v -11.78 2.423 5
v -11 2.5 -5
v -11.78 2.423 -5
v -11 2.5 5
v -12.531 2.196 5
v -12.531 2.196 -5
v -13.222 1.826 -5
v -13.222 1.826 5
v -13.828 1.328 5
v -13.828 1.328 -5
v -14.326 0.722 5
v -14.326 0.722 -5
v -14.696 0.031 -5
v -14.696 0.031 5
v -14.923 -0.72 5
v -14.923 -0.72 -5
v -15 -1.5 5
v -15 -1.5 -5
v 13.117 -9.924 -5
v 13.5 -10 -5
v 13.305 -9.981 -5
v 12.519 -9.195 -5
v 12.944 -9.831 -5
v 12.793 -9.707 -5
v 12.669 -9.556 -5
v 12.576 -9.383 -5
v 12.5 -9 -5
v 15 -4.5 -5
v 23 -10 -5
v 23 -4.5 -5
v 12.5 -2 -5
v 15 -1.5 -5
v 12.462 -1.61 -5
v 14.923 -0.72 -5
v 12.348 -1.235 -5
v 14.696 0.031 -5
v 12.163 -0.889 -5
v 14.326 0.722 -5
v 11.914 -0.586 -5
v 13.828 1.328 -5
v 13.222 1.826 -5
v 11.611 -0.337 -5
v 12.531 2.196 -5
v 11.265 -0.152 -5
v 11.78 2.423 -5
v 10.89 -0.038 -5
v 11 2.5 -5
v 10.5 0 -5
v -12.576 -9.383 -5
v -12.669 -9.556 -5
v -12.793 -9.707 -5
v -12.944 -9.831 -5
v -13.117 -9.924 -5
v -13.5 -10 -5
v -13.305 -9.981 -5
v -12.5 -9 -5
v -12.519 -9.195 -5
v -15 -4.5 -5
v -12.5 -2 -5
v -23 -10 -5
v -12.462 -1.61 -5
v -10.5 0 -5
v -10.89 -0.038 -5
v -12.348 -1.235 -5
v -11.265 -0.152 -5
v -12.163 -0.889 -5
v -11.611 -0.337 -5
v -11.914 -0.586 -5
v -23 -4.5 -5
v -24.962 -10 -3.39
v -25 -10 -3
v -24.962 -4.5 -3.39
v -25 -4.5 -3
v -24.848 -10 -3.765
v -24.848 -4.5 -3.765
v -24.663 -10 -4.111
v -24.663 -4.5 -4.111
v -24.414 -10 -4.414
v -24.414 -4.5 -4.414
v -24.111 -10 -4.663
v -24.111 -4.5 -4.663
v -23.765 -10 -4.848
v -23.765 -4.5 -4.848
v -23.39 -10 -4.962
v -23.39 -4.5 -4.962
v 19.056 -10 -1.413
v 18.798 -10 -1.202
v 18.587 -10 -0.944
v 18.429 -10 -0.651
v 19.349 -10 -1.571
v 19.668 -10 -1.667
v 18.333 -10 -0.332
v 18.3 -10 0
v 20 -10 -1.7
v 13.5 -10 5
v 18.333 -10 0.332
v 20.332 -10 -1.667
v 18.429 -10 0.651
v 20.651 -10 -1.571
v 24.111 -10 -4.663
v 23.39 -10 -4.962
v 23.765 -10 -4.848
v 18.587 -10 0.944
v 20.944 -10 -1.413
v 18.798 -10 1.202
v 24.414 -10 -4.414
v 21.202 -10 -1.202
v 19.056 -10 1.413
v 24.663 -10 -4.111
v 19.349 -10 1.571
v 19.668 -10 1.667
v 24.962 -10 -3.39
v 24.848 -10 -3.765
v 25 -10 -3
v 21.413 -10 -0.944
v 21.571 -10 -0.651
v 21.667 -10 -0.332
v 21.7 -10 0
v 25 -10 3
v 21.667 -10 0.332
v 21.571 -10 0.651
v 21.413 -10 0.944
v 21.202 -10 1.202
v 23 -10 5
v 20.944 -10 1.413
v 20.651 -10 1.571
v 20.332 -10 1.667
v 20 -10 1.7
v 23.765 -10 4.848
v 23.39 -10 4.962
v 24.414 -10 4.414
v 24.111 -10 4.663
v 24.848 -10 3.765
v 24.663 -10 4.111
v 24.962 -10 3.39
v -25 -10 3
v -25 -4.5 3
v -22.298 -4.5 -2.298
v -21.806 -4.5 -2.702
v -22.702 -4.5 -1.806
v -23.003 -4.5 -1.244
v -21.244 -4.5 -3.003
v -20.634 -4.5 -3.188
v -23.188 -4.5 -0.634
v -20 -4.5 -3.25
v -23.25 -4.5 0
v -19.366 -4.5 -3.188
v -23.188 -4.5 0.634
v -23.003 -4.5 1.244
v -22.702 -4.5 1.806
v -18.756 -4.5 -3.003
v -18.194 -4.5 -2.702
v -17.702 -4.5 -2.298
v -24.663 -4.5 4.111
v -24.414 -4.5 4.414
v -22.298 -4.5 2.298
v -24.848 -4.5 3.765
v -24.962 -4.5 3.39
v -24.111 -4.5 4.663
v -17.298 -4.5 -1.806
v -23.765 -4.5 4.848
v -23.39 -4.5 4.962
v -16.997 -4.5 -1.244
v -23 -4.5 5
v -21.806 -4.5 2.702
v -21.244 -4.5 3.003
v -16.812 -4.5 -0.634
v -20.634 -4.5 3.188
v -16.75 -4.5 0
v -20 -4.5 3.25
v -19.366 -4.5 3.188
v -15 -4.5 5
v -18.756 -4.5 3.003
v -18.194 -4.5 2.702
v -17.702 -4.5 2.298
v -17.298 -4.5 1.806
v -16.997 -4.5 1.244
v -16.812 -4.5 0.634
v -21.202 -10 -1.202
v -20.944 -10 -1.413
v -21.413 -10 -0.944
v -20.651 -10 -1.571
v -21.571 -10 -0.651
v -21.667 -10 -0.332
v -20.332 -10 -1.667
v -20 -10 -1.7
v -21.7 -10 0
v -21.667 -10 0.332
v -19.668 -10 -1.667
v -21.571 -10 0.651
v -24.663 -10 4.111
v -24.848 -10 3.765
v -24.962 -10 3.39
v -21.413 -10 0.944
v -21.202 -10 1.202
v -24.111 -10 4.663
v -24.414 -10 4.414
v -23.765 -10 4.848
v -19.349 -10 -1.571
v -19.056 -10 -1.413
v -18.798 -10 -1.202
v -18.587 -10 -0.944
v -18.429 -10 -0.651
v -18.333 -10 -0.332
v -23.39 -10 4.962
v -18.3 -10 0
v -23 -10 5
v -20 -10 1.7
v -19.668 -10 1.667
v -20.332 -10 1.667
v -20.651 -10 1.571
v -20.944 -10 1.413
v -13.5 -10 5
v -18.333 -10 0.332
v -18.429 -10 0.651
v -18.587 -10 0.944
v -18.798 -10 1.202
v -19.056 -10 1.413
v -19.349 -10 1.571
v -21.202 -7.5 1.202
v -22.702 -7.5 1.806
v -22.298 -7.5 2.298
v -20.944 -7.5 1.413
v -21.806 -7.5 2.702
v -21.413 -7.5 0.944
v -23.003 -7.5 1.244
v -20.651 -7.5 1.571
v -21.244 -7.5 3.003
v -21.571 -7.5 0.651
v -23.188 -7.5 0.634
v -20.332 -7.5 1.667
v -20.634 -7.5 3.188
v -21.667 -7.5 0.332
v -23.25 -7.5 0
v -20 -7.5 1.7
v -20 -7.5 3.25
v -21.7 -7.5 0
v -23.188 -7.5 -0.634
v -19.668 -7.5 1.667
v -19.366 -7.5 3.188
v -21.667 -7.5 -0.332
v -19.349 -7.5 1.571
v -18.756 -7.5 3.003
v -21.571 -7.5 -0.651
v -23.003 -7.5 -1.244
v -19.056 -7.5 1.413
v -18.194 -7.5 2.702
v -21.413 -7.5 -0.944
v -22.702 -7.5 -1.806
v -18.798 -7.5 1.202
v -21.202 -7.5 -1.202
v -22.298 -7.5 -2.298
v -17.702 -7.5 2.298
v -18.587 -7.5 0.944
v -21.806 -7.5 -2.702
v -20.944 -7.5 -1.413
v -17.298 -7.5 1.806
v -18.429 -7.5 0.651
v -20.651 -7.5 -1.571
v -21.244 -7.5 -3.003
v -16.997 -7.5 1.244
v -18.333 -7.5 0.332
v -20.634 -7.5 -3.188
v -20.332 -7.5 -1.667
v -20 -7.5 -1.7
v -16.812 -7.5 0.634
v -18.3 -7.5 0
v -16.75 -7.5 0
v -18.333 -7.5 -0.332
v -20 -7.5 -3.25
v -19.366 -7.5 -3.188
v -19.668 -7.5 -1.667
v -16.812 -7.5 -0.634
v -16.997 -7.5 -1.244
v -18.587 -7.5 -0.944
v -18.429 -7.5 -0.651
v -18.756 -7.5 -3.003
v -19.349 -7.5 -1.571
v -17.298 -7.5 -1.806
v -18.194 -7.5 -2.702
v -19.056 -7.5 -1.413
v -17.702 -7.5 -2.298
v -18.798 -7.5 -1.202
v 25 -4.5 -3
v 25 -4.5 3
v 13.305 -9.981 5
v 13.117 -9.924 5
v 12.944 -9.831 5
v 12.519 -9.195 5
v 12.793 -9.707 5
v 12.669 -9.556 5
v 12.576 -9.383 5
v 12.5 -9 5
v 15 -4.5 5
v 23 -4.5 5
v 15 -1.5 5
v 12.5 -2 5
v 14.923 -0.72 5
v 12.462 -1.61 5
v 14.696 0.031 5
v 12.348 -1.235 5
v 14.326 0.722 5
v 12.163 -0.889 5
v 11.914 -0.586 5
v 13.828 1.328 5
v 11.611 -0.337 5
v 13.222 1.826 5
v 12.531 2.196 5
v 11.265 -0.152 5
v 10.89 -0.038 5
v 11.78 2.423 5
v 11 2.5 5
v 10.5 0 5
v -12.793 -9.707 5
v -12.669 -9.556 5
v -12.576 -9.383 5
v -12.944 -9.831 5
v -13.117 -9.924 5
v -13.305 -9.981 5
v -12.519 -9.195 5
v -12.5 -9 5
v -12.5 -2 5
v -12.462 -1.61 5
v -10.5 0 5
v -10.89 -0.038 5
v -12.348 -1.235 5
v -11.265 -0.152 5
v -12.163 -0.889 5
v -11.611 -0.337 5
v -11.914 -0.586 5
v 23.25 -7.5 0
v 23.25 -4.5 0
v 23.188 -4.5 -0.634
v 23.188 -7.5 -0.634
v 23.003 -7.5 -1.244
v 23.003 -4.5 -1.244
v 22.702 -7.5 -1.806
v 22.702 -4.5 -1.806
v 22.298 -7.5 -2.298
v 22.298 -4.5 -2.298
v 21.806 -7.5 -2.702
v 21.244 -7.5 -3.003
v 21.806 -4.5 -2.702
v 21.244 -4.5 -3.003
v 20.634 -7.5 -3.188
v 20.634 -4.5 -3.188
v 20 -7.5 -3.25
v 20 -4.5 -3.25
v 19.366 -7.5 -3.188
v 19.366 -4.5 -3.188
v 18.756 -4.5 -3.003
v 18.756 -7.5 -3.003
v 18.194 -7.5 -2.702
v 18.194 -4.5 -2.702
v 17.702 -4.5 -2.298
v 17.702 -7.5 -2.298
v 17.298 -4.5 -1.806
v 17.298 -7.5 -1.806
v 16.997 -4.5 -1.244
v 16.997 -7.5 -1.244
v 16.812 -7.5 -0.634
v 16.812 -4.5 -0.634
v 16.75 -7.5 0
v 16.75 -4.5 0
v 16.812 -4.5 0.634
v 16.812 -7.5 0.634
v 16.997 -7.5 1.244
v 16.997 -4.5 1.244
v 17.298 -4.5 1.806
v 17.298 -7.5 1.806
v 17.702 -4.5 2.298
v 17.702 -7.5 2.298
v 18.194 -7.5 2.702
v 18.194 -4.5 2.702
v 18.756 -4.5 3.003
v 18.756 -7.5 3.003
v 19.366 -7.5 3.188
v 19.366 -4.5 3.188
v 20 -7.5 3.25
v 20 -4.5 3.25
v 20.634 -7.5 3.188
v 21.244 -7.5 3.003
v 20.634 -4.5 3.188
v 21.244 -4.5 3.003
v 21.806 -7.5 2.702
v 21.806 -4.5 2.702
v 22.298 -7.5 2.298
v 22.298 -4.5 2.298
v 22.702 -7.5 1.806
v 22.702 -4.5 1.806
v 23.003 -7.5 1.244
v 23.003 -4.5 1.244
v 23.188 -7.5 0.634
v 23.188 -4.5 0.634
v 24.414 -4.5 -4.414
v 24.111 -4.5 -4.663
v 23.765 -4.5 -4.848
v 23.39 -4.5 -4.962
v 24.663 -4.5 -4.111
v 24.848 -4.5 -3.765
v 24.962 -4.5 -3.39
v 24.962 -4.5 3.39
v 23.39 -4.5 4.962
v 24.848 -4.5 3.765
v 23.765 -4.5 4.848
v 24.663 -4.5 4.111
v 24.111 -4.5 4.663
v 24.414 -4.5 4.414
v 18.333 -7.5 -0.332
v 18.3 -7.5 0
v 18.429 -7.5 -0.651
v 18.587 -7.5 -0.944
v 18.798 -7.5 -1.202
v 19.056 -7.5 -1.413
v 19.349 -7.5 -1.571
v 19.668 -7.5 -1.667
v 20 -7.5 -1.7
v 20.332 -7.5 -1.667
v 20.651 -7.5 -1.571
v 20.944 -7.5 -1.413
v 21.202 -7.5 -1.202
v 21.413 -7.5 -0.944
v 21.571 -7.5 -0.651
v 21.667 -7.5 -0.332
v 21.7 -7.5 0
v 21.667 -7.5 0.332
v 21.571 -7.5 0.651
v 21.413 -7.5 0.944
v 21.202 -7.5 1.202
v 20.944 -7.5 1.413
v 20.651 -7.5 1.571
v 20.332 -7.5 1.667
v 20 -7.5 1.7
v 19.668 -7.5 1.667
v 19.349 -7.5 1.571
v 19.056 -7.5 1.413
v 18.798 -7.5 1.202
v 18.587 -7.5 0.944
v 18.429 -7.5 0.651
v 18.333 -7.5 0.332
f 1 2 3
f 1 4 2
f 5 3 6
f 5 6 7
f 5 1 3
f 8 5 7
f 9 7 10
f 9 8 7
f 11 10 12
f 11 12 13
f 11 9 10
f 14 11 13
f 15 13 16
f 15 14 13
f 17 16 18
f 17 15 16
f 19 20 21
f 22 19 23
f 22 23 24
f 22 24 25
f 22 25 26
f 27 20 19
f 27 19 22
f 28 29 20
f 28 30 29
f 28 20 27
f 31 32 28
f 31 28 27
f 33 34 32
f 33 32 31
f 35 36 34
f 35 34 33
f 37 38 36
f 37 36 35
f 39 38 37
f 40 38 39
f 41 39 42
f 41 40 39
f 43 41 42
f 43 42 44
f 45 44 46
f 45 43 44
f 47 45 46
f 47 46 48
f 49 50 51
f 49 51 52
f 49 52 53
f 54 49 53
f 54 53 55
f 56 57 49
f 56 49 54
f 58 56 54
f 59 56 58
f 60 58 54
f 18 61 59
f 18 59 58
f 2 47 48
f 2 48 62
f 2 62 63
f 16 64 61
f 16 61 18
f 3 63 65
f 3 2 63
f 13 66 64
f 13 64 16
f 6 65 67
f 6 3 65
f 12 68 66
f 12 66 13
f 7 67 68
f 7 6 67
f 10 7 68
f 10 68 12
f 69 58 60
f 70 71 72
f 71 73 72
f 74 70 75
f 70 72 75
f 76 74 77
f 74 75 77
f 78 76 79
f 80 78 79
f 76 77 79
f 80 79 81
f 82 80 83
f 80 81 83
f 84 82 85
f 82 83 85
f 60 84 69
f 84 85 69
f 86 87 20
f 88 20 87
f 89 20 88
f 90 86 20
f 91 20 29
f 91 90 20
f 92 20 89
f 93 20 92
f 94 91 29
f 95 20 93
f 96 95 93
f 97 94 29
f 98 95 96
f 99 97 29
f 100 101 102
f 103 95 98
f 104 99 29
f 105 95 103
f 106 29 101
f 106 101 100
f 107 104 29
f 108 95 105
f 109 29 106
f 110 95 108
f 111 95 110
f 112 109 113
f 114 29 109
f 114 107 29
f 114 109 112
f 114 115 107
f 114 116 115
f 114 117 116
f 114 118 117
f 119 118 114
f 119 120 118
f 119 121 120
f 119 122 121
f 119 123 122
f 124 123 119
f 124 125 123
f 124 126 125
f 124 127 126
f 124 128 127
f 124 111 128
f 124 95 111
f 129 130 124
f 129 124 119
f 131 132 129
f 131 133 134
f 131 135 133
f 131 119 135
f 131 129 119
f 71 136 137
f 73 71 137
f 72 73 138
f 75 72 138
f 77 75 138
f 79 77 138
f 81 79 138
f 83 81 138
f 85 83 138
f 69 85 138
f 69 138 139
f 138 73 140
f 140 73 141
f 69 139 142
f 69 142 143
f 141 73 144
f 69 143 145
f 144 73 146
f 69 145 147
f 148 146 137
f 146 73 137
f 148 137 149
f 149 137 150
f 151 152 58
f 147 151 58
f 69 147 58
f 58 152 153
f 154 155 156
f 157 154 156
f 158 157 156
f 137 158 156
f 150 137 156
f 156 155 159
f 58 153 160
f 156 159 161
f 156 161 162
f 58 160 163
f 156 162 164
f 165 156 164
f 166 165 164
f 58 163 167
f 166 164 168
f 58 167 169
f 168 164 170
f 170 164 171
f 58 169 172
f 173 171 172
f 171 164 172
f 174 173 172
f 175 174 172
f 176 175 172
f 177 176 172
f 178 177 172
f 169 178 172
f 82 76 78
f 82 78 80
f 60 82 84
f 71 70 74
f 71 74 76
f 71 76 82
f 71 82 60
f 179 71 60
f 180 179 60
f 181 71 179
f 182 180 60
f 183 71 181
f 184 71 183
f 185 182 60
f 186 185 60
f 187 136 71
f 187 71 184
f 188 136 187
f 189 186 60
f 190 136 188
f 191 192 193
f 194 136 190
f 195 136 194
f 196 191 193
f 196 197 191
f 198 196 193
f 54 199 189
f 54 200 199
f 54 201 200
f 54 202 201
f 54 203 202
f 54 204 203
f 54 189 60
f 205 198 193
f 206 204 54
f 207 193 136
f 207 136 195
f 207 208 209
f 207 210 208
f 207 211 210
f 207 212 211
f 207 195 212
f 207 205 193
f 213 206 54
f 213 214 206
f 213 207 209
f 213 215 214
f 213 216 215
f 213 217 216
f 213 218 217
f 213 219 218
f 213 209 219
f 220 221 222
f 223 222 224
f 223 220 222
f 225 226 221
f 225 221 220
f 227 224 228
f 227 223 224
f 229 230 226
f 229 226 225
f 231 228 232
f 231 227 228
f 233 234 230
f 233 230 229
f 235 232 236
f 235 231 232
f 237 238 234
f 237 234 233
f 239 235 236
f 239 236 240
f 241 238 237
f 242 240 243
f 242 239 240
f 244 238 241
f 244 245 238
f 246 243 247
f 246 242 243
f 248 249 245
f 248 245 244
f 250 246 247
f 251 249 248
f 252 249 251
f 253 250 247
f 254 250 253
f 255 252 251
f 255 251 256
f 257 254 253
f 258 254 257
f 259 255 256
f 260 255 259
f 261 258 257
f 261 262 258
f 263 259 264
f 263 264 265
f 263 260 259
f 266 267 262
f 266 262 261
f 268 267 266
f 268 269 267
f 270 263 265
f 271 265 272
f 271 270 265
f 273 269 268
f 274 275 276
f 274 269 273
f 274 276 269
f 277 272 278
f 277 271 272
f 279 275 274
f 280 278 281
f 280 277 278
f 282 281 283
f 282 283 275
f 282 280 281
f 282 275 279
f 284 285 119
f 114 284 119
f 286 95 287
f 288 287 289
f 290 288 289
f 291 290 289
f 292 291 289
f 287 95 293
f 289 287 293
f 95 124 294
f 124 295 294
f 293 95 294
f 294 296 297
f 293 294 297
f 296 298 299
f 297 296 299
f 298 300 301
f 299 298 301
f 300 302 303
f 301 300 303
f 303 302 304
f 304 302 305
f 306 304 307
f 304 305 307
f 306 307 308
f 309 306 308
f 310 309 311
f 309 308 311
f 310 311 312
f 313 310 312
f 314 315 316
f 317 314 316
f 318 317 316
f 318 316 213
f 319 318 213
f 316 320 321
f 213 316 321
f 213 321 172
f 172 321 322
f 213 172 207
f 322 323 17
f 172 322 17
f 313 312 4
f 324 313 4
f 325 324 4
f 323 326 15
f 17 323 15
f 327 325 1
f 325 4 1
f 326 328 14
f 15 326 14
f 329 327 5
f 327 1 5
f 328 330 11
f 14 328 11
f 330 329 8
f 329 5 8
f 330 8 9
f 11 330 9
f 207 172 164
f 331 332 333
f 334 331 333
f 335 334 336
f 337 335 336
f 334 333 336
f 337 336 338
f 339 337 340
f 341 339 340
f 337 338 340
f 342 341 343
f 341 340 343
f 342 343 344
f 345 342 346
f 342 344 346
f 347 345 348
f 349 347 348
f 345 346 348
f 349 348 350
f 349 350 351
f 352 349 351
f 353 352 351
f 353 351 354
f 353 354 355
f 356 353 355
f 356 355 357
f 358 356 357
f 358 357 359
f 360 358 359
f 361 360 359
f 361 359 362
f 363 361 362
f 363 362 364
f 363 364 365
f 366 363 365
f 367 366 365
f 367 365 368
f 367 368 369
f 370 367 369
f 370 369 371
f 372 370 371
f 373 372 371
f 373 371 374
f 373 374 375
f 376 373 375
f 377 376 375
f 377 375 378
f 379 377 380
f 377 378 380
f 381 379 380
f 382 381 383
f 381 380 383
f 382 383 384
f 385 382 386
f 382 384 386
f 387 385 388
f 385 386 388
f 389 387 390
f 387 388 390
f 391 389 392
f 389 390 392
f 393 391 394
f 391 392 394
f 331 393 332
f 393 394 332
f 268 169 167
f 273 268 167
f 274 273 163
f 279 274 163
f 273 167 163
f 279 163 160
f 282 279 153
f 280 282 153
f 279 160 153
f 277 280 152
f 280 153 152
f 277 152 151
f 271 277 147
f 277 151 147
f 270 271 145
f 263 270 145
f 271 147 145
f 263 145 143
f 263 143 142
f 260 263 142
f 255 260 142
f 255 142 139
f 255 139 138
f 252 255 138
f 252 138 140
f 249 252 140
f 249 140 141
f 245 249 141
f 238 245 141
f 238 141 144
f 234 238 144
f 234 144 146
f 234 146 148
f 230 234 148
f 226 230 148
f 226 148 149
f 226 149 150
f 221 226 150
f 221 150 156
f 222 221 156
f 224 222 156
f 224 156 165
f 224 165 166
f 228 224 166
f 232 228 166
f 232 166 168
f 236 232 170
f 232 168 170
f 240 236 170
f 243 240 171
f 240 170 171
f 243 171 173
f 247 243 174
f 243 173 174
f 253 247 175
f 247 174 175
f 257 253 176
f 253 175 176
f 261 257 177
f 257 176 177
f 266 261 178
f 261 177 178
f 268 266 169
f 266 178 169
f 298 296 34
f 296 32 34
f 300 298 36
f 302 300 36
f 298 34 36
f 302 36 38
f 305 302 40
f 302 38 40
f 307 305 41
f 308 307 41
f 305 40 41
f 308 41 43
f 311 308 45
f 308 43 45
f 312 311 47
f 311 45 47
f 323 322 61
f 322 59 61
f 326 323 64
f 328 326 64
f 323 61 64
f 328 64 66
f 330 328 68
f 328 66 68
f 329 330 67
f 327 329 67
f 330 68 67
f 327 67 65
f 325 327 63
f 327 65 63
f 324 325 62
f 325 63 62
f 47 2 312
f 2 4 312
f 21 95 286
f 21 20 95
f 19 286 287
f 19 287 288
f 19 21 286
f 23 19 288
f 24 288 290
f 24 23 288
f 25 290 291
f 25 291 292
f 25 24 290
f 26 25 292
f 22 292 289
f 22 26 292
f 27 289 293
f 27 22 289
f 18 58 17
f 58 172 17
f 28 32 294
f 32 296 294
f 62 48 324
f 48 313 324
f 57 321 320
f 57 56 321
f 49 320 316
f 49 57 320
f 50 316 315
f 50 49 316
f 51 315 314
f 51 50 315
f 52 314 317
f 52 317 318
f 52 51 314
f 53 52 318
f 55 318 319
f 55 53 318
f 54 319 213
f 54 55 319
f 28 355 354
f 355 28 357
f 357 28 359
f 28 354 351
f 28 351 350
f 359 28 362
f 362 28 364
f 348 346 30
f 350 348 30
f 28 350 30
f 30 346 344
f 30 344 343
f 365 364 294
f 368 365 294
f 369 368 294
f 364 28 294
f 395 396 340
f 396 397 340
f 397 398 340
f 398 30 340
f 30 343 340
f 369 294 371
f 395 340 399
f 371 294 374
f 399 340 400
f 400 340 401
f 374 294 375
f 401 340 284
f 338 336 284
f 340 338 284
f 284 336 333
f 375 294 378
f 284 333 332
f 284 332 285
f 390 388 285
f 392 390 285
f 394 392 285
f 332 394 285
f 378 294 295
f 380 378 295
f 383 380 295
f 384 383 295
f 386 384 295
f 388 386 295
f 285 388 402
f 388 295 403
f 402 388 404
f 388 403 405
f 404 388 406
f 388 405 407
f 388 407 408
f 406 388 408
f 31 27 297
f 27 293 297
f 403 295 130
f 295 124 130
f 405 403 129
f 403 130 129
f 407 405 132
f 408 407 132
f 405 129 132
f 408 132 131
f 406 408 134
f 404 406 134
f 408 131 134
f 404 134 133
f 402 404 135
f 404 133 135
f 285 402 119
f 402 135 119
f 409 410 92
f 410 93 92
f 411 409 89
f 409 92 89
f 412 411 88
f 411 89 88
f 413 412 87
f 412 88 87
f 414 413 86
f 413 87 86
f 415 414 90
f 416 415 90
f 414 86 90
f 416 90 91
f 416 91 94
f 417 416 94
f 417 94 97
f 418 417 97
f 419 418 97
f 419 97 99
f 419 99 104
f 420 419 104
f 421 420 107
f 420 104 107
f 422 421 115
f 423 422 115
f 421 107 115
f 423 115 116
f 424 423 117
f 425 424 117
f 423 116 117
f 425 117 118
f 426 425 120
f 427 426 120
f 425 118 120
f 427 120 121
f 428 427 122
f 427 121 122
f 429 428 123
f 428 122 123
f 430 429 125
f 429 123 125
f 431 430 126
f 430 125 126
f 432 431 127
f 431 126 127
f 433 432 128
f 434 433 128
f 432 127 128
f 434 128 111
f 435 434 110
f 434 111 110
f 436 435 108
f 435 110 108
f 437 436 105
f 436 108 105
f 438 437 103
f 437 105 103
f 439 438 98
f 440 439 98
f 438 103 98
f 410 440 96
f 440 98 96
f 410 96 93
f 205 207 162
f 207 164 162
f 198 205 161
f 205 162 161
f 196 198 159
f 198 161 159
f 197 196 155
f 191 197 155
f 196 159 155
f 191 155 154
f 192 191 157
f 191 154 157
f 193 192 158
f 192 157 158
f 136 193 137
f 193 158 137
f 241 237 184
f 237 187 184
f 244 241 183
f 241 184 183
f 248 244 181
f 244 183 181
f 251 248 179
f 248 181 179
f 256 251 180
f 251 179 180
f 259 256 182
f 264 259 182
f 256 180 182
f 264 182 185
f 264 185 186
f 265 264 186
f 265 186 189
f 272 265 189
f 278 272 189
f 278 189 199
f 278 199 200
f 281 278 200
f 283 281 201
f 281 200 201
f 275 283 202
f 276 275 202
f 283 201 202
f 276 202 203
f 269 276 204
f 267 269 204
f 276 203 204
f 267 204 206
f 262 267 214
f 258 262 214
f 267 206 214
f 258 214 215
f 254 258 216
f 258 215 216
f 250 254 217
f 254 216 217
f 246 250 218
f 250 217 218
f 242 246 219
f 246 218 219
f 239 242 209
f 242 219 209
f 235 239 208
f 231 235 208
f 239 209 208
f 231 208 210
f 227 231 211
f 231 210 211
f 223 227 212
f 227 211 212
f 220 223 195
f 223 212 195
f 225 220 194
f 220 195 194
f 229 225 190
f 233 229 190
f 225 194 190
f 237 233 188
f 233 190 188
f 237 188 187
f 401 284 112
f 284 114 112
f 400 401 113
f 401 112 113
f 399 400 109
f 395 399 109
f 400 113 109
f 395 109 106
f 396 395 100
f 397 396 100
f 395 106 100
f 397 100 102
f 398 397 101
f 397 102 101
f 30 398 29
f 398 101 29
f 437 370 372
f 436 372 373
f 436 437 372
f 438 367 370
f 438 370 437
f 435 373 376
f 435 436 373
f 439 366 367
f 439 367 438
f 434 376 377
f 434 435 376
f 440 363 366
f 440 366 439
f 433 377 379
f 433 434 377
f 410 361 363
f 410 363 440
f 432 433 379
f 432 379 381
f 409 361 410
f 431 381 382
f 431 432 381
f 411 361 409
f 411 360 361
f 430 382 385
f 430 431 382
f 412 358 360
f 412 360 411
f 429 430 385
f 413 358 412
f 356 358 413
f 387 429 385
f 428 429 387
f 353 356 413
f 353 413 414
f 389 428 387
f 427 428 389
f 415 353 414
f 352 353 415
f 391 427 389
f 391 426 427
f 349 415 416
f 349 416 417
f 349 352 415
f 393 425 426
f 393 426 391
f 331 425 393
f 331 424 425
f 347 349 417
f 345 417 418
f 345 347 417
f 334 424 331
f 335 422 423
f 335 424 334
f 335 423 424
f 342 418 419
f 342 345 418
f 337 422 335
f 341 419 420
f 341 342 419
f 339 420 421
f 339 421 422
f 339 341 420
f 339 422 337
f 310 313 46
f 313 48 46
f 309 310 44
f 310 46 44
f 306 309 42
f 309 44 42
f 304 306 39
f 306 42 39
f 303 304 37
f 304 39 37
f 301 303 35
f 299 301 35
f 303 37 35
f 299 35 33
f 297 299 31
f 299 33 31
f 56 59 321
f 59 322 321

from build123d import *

# Parameters (mm, degrees)
BOSS_EXTRUDE1_DEPTH            = 5
FILLET1_R                      = 2
FILLET2_R                      = 4
FILLET3_R                      = 2
FILLET4_R                      = 1
CBORE_FOR_M3_SHCS2_D           = 3.4
CBORE_FOR_M3_SHCS2_CBORE_D     = 6.5
CBORE_FOR_M3_SHCS2_CBORE_DEPTH = 3


with BuildPart() as part:
    # Sketch1 → Boss-Extrude1 (new body, symmetric)
    with BuildSketch(Plane.XY):
        Polygon((-15, 2.5), (15, 2.5), (15, -4.5), (25, -4.5), (25, -10), (15, -10), (12.5, -10), (12.5, 0), (-12.5, 0), (-12.5, -10), (-15, -10), (-25, -10), (-25, -4.5), (-15, -4.5), align=None)
    extrude(amount=BOSS_EXTRUDE1_DEPTH, both=True)

    # Fillet1
    fillet1_edges = [part.edges().sort_by_distance(p)[0] for p in [
        (12.5, 0, 0),
        (-12.5, 0, 0),
    ]]
    fillet(fillet1_edges, radius=FILLET1_R)

    # Fillet2
    fillet2_edges = [part.edges().sort_by_distance(p)[0] for p in [
        (-15, 2.5, 0),
        (15, 2.5, 0),
    ]]
    fillet(fillet2_edges, radius=FILLET2_R)

    # Fillet3
    fillet3_edges = [part.edges().sort_by_distance(p)[0] for p in [
        (25, -7.25, -5),
        (-25, -7.25, -5),
        (-25, -7.25, 5),
        (25, -7.25, 5),
    ]]
    fillet(fillet3_edges, radius=FILLET3_R)

    # Fillet4
    fillet4_edges = [part.edges().sort_by_distance(p)[0] for p in [
        (12.5, -10, 0),
        (-12.5, -10, 0),
    ]]
    fillet(fillet4_edges, radius=FILLET4_R)

    # CBORE for M3 SHCS2 (through all)
    with Locations(Plane(origin=(0, -4.5, 0), x_dir=(1, 0, 0), z_dir=(0, 1, 0))):
        with Locations((20, 0), (-20, 0)):
            CounterBoreHole(CBORE_FOR_M3_SHCS2_D / 2, CBORE_FOR_M3_SHCS2_CBORE_D / 2, CBORE_FOR_M3_SHCS2_CBORE_DEPTH)


solid = part.part
